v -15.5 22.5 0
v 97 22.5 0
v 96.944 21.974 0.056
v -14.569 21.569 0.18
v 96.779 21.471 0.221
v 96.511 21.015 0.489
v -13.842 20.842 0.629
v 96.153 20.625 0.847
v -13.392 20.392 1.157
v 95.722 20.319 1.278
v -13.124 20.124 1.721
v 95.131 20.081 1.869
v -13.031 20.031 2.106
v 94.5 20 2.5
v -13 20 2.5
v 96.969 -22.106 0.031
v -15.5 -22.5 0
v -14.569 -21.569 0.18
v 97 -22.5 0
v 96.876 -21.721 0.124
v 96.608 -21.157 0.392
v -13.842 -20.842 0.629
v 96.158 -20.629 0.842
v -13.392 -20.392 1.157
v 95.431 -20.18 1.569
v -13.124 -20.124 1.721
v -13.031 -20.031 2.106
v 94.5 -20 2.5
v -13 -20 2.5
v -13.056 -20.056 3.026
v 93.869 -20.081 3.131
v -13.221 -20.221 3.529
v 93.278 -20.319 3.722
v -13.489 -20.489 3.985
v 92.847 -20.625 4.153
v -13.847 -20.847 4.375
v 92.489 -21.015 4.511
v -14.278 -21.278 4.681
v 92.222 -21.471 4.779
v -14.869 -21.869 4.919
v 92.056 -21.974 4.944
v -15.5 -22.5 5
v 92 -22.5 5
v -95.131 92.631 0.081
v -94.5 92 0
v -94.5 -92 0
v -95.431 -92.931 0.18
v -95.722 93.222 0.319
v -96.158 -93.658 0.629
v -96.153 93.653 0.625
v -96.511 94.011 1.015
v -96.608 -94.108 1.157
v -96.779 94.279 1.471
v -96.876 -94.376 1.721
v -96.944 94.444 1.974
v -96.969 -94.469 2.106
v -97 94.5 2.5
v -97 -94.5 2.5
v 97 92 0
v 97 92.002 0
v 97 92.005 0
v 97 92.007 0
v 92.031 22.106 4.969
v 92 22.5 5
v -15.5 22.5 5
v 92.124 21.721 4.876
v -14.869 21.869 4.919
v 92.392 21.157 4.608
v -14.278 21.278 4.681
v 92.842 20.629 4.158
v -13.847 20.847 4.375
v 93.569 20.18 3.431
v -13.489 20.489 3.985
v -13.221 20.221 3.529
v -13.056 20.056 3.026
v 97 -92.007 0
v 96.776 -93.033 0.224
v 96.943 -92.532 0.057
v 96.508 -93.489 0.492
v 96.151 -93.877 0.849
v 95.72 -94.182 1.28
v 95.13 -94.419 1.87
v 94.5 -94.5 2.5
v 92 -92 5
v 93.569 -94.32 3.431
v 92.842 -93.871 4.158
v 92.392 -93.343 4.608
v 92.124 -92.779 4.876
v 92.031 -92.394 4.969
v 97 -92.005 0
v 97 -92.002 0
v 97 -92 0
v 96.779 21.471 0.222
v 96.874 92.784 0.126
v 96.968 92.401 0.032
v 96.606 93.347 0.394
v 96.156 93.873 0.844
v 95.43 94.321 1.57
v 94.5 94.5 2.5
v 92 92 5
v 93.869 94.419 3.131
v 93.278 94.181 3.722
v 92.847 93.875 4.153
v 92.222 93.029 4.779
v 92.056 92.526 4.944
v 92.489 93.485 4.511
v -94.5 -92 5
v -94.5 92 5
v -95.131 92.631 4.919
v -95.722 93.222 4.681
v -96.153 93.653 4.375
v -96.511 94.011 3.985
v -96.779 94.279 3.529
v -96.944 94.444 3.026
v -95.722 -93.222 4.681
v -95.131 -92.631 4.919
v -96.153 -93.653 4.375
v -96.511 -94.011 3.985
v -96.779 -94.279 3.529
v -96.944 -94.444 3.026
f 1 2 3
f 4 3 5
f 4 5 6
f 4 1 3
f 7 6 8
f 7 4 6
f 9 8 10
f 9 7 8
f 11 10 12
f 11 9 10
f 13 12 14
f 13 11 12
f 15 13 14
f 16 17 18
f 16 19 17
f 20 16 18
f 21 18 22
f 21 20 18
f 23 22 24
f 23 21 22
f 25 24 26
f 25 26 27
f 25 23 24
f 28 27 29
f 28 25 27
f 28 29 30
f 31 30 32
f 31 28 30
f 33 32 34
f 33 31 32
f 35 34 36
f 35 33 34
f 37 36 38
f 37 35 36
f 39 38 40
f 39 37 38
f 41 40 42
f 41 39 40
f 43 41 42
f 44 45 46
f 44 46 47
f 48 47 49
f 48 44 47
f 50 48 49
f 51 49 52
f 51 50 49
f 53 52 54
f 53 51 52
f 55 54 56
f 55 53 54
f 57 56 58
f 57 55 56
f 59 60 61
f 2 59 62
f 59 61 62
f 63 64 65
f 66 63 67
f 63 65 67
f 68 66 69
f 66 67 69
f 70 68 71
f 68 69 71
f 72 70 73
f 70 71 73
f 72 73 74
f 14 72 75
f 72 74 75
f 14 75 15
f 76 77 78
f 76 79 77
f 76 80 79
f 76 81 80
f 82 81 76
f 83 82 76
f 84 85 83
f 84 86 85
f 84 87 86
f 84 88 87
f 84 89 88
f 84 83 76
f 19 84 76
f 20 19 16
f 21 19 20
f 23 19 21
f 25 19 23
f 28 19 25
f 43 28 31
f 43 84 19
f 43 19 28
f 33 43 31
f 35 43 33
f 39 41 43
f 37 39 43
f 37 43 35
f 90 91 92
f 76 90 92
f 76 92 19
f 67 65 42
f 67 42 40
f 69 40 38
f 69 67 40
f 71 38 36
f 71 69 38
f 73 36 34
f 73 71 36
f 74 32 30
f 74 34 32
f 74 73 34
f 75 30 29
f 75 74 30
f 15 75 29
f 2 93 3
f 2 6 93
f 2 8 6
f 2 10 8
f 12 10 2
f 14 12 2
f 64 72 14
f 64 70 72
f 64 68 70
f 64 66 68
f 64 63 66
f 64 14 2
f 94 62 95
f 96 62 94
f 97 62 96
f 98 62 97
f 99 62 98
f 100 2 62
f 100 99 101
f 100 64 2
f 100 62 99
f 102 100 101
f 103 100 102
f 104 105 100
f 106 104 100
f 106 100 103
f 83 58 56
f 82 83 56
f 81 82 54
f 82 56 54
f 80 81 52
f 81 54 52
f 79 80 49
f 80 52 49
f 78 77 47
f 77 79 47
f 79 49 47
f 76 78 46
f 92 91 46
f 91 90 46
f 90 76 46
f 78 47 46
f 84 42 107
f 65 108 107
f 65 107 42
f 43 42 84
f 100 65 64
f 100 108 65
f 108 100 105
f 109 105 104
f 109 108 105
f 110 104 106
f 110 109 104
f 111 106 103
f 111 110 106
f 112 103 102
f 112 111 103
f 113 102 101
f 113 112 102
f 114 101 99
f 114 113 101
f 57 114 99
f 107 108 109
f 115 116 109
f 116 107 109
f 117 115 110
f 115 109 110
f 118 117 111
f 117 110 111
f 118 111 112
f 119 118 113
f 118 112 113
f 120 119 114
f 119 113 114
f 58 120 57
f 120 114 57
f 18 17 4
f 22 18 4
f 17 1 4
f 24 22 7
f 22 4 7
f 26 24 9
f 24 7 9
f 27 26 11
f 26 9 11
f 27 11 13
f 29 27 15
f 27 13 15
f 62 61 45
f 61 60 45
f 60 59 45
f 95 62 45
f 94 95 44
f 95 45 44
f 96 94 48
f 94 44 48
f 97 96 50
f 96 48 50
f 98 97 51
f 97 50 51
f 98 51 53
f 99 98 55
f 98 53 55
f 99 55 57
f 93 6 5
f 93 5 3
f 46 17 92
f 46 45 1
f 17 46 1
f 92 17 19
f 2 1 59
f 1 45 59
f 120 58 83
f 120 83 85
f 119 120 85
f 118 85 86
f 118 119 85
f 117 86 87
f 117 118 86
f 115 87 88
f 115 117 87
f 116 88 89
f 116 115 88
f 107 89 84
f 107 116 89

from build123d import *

# Parameters (mm, degrees)
F1_DEPTH     = 5
F2_SIZE      = 4.99999
F3_T1_DEPTH  = 40
F3_T3_DEPTH  = 111.25001
F3_T5_DEPTH  = 12.50001
F3_T7_DEPTH  = 116.25
F3_T9_DEPTH  = 206.5
F3_T11_DEPTH = 201.5
F3_T13_DEPTH = 201.50001
F3_T19_DEPTH = 117.50001
F3_T23_DEPTH = 46.25
F3_T30_DEPTH = 46.25
F3_T34_DEPTH = 117.50001
F3_T41_DEPTH = 122.5
F3_T45_DEPTH = 46.25
F3_T52_DEPTH = 46.25
F3_T56_DEPTH = 122.5


# Not quite as in the source:
# - a fillet or chamfer that OpenCascade refuses, or shapes differently, is made with other operations: its cross-section is extruded or revolved along the edge and cut away or added
# - a fillet or chamfer is up to 0.001 mm smaller than in the source, because OpenCascade refuses the exact size


with BuildPart() as f1:
    # F0 (on Top) → F1 (new body)
    with BuildSketch(Plane.XY):
        Polygon((-97, -94.5), (97, -94.5), (97, -20), (-13, -20), (-13, 20), (97, 20), (97, 94.5), (-97, 94.5), align=None)
    extrude(amount=F1_DEPTH)

    # F2 (size 5 in the source; OpenCascade refuses exactly that, so slightly less here)
    f2_edges = [f1.edges().sort_by_distance(p)[0] for p in [
        (97, -57.25, 5),
        (97, 57.25, 5),
    ]]
    chamfer(f2_edges, length=F2_SIZE)

    # F3: fillet of radius 2.5 on 14 edges, made by hand

    # F3_s2 → F3_t1 (cut)
    with BuildSketch(Plane.XZ.offset(-20)):
        with BuildLine():
            ThreePointArc((-15.5, 5), (-13.732233047, 4.267766953), (-13, 2.5))
            Line((-13, 2.5), (-13, 5))
            Line((-13, 5), (-15.5, 5))
        make_face()
        with BuildLine():
            ThreePointArc((-15.5, 0), (-13.732233047, 0.732233047), (-13, 2.5))
            Line((-13, 2.5), (-13, 0))
            Line((-13, 0), (-15.5, 0))
        make_face()
    extrude(amount=F3_T1_DEPTH, mode=Mode.SUBTRACT)

    # F3_s4 → F3_t3 (cut)
    with BuildSketch(Plane.YZ.offset(-13)):
        with BuildLine():
            ThreePointArc((22.5, 5), (20.732233047, 4.267766953), (20, 2.5))
            Line((20, 2.5), (20, 5))
            Line((20, 5), (22.5, 5))
        make_face()
        with BuildLine():
            ThreePointArc((-22.5, 5), (-20.732233047, 4.267766953), (-20, 2.5))
            Line((-20, 2.5), (-20, 5))
            Line((-20, 5), (-22.5, 5))
        make_face()
    extrude(amount=F3_T3_DEPTH, mode=Mode.SUBTRACT)

    # F3_s6 → F3_t5 (cut)
    with BuildSketch(Plane.XY.offset(-6.25)):
        with BuildLine():
            ThreePointArc((97, -22.5), (96.267766953, -20.732233047), (94.5, -20))
            Line((94.5, -20), (97, -20))
            Line((97, -20), (97, -22.5))
        make_face()
        with BuildLine():
            ThreePointArc((94.5, 20), (96.267766953, 20.732233047), (97, 22.5))
            Line((97, 22.5), (97, 20))
            Line((97, 20), (94.5, 20))
        make_face()
    extrude(amount=F3_T5_DEPTH, mode=Mode.SUBTRACT)

    # F3_s8 → F3_t7 (cut)
    with BuildSketch(Plane.YZ.offset(-13)):
        with BuildLine():
            ThreePointArc((-22.5, 0), (-20.732233047, 0.732233047), (-20, 2.5))
            Line((-20, 2.5), (-20, 0))
            Line((-20, 0), (-22.5, 0))
        make_face()
        with BuildLine():
            ThreePointArc((22.5, 0), (20.732233047, 0.732233047), (20, 2.5))
            Line((20, 2.5), (20, 0))
            Line((20, 0), (22.5, 0))
        make_face()
    extrude(amount=F3_T7_DEPTH, mode=Mode.SUBTRACT)

    # F3_s10 → F3_t9 (cut)
    with BuildSketch(Plane.YZ.offset(-103.25)):
        with BuildLine():
            ThreePointArc((-94.5, 2.5), (-93.767766953, 0.732233047), (-92, 0))
            Line((-92, 0), (-94.5, 0))
            Line((-94.5, 0), (-94.5, 2.5))
        make_face()
        with BuildLine():
            ThreePointArc((92, 0), (93.767766953, 0.732233047), (94.5, 2.5))
            Line((94.5, 2.5), (94.5, 0))
            Line((94.5, 0), (92, 0))
        make_face()
    extrude(amount=F3_T9_DEPTH, mode=Mode.SUBTRACT)

    # F3_s12 → F3_t11 (cut)
    with BuildSketch(Plane.XZ.offset(-100.75)):
        with BuildLine():
            ThreePointArc((-94.5, 0), (-96.267766953, 0.732233047), (-97, 2.5))
            Line((-97, 2.5), (-97, 0))
            Line((-97, 0), (-94.5, 0))
        make_face()
        with BuildLine():
            ThreePointArc((-94.5, 5), (-96.267766953, 4.267766953), (-97, 2.5))
            Line((-97, 2.5), (-97, 5))
            Line((-97, 5), (-94.5, 5))
        make_face()
    extrude(amount=F3_T11_DEPTH, mode=Mode.SUBTRACT)

    # F3_s14 → F3_t13 (cut)
    with BuildSketch(Plane.YZ.offset(-103.25)):
        with BuildLine():
            ThreePointArc((92, 5), (93.767766953, 4.267766953), (94.5, 2.5))
            Line((94.5, 2.5), (94.5, 5))
            Line((94.5, 5), (92, 5))
        make_face()
        with BuildLine():
            ThreePointArc((-94.5, 2.5), (-93.767766953, 4.267766953), (-92, 5))
            Line((-92, 5), (-94.5, 5))
            Line((-94.5, 5), (-94.5, 2.5))
        make_face()
    extrude(amount=F3_T13_DEPTH, mode=Mode.SUBTRACT)


with BuildPart() as f3_tool17:
    # F3_s18 → F3_t19 (new body)
    with BuildSketch(Plane.YZ.offset(98.25001)):
        with BuildLine():
            ThreePointArc((-22.5, 5), (-20.732233047, 4.267766953), (-20, 2.5))
            Line((-20, 2.5), (-20, 5))
            Line((-20, 5), (-22.5, 5))
        make_face()
    extrude(amount=-F3_T19_DEPTH)

    split(bisect_by=Plane.YZ.offset(-13), keep=Keep.BOTTOM)


with BuildPart() as f3_tool21:
    # F3_s22 → F3_t23 (new body)
    with BuildSketch(Plane.XZ.offset(26.25)):
        with BuildLine():
            ThreePointArc((-15.5, 5), (-13.732233047, 4.267766953), (-13, 2.5))
            Line((-13, 2.5), (-13, 5))
            Line((-13, 5), (-15.5, 5))
        make_face()
    extrude(amount=-F3_T23_DEPTH)

    split(bisect_by=Plane.XZ.offset(20), keep=Keep.TOP)


with BuildPart() as f3_tool17_1:
    add(f3_tool17.part)

    # F3_t25: intersect F3_tool21
    add(f3_tool21.part, mode=Mode.INTERSECT)


with BuildPart() as f1_1:
    add(f1.part)

    # F3_t15: cut F3_tool17
    add(f3_tool17_1.part, mode=Mode.SUBTRACT)


with BuildPart() as f3_tool28:
    # F3_s29 → F3_t30 (new body)
    with BuildSketch(Plane.XZ.offset(20)):
        with BuildLine():
            ThreePointArc((-15.5, 5), (-13.732233047, 4.267766953), (-13, 2.5))
            Line((-13, 2.5), (-13, 5))
            Line((-13, 5), (-15.5, 5))
        make_face()
    extrude(amount=-F3_T30_DEPTH)

    split(bisect_by=Plane.XZ.offset(-20), keep=Keep.BOTTOM)


with BuildPart() as f3_tool32:
    # F3_s33 → F3_t34 (new body)
    with BuildSketch(Plane.YZ.offset(-19.25)):
        with BuildLine():
            ThreePointArc((22.5, 5), (20.732233047, 4.267766953), (20, 2.5))
            Line((20, 2.5), (20, 5))
            Line((20, 5), (22.5, 5))
        make_face()
    extrude(amount=F3_T34_DEPTH)

    split(bisect_by=Plane.YZ.offset(-13), keep=Keep.BOTTOM)


with BuildPart() as f3_tool28_1:
    add(f3_tool28.part)

    # F3_t36: intersect F3_tool32
    add(f3_tool32.part, mode=Mode.INTERSECT)


with BuildPart() as f1_2:
    add(f1_1.part)

    # F3_t26: cut F3_tool28
    add(f3_tool28_1.part, mode=Mode.SUBTRACT)


with BuildPart() as f3_tool39:
    # F3_s40 → F3_t41 (new body)
    with BuildSketch(Plane.YZ.offset(103.25)):
        with BuildLine():
            ThreePointArc((-22.5, 0), (-20.732233047, 0.732233047), (-20, 2.5))
            Line((-20, 2.5), (-20, 0))
            Line((-20, 0), (-22.5, 0))
        make_face()
    extrude(amount=-F3_T41_DEPTH)

    split(bisect_by=Plane.YZ.offset(-13), keep=Keep.BOTTOM)


with BuildPart() as f3_tool43:
    # F3_s44 → F3_t45 (new body)
    with BuildSketch(Plane.XZ.offset(26.25)):
        with BuildLine():
            ThreePointArc((-15.5, 0), (-13.732233047, 0.732233047), (-13, 2.5))
            Line((-13, 2.5), (-13, 0))
            Line((-13, 0), (-15.5, 0))
        make_face()
    extrude(amount=-F3_T45_DEPTH)

    split(bisect_by=Plane.XZ.offset(20), keep=Keep.TOP)


with BuildPart() as f3_tool39_1:
    add(f3_tool39.part)

    # F3_t47: intersect F3_tool43
    add(f3_tool43.part, mode=Mode.INTERSECT)


with BuildPart() as f1_3:
    add(f1_2.part)

    # F3_t37: cut F3_tool39
    add(f3_tool39_1.part, mode=Mode.SUBTRACT)


with BuildPart() as f3_tool50:
    # F3_s51 → F3_t52 (new body)
    with BuildSketch(Plane.XZ.offset(20)):
        with BuildLine():
            ThreePointArc((-15.5, 0), (-13.732233047, 0.732233047), (-13, 2.5))
            Line((-13, 2.5), (-13, 0))
            Line((-13, 0), (-15.5, 0))
        make_face()
    extrude(amount=-F3_T52_DEPTH)

    split(bisect_by=Plane.XZ.offset(-20), keep=Keep.BOTTOM)


with BuildPart() as f3_tool54:
    # F3_s55 → F3_t56 (new body)
    with BuildSketch(Plane.YZ.offset(-19.25)):
        with BuildLine():
            ThreePointArc((22.5, 0), (20.732233047, 0.732233047), (20, 2.5))
            Line((20, 2.5), (20, 0))
            Line((20, 0), (22.5, 0))
        make_face()
    extrude(amount=F3_T56_DEPTH)

    split(bisect_by=Plane.YZ.offset(-13), keep=Keep.BOTTOM)


with BuildPart() as f3_tool50_1:
    add(f3_tool50.part)

    # F3_t58: intersect F3_tool54
    add(f3_tool54.part, mode=Mode.INTERSECT)


with BuildPart() as f1_4:
    add(f1_3.part)

    # F3_t48: cut F3_tool50
    add(f3_tool50_1.part, mode=Mode.SUBTRACT)


solid = f1_4.part
